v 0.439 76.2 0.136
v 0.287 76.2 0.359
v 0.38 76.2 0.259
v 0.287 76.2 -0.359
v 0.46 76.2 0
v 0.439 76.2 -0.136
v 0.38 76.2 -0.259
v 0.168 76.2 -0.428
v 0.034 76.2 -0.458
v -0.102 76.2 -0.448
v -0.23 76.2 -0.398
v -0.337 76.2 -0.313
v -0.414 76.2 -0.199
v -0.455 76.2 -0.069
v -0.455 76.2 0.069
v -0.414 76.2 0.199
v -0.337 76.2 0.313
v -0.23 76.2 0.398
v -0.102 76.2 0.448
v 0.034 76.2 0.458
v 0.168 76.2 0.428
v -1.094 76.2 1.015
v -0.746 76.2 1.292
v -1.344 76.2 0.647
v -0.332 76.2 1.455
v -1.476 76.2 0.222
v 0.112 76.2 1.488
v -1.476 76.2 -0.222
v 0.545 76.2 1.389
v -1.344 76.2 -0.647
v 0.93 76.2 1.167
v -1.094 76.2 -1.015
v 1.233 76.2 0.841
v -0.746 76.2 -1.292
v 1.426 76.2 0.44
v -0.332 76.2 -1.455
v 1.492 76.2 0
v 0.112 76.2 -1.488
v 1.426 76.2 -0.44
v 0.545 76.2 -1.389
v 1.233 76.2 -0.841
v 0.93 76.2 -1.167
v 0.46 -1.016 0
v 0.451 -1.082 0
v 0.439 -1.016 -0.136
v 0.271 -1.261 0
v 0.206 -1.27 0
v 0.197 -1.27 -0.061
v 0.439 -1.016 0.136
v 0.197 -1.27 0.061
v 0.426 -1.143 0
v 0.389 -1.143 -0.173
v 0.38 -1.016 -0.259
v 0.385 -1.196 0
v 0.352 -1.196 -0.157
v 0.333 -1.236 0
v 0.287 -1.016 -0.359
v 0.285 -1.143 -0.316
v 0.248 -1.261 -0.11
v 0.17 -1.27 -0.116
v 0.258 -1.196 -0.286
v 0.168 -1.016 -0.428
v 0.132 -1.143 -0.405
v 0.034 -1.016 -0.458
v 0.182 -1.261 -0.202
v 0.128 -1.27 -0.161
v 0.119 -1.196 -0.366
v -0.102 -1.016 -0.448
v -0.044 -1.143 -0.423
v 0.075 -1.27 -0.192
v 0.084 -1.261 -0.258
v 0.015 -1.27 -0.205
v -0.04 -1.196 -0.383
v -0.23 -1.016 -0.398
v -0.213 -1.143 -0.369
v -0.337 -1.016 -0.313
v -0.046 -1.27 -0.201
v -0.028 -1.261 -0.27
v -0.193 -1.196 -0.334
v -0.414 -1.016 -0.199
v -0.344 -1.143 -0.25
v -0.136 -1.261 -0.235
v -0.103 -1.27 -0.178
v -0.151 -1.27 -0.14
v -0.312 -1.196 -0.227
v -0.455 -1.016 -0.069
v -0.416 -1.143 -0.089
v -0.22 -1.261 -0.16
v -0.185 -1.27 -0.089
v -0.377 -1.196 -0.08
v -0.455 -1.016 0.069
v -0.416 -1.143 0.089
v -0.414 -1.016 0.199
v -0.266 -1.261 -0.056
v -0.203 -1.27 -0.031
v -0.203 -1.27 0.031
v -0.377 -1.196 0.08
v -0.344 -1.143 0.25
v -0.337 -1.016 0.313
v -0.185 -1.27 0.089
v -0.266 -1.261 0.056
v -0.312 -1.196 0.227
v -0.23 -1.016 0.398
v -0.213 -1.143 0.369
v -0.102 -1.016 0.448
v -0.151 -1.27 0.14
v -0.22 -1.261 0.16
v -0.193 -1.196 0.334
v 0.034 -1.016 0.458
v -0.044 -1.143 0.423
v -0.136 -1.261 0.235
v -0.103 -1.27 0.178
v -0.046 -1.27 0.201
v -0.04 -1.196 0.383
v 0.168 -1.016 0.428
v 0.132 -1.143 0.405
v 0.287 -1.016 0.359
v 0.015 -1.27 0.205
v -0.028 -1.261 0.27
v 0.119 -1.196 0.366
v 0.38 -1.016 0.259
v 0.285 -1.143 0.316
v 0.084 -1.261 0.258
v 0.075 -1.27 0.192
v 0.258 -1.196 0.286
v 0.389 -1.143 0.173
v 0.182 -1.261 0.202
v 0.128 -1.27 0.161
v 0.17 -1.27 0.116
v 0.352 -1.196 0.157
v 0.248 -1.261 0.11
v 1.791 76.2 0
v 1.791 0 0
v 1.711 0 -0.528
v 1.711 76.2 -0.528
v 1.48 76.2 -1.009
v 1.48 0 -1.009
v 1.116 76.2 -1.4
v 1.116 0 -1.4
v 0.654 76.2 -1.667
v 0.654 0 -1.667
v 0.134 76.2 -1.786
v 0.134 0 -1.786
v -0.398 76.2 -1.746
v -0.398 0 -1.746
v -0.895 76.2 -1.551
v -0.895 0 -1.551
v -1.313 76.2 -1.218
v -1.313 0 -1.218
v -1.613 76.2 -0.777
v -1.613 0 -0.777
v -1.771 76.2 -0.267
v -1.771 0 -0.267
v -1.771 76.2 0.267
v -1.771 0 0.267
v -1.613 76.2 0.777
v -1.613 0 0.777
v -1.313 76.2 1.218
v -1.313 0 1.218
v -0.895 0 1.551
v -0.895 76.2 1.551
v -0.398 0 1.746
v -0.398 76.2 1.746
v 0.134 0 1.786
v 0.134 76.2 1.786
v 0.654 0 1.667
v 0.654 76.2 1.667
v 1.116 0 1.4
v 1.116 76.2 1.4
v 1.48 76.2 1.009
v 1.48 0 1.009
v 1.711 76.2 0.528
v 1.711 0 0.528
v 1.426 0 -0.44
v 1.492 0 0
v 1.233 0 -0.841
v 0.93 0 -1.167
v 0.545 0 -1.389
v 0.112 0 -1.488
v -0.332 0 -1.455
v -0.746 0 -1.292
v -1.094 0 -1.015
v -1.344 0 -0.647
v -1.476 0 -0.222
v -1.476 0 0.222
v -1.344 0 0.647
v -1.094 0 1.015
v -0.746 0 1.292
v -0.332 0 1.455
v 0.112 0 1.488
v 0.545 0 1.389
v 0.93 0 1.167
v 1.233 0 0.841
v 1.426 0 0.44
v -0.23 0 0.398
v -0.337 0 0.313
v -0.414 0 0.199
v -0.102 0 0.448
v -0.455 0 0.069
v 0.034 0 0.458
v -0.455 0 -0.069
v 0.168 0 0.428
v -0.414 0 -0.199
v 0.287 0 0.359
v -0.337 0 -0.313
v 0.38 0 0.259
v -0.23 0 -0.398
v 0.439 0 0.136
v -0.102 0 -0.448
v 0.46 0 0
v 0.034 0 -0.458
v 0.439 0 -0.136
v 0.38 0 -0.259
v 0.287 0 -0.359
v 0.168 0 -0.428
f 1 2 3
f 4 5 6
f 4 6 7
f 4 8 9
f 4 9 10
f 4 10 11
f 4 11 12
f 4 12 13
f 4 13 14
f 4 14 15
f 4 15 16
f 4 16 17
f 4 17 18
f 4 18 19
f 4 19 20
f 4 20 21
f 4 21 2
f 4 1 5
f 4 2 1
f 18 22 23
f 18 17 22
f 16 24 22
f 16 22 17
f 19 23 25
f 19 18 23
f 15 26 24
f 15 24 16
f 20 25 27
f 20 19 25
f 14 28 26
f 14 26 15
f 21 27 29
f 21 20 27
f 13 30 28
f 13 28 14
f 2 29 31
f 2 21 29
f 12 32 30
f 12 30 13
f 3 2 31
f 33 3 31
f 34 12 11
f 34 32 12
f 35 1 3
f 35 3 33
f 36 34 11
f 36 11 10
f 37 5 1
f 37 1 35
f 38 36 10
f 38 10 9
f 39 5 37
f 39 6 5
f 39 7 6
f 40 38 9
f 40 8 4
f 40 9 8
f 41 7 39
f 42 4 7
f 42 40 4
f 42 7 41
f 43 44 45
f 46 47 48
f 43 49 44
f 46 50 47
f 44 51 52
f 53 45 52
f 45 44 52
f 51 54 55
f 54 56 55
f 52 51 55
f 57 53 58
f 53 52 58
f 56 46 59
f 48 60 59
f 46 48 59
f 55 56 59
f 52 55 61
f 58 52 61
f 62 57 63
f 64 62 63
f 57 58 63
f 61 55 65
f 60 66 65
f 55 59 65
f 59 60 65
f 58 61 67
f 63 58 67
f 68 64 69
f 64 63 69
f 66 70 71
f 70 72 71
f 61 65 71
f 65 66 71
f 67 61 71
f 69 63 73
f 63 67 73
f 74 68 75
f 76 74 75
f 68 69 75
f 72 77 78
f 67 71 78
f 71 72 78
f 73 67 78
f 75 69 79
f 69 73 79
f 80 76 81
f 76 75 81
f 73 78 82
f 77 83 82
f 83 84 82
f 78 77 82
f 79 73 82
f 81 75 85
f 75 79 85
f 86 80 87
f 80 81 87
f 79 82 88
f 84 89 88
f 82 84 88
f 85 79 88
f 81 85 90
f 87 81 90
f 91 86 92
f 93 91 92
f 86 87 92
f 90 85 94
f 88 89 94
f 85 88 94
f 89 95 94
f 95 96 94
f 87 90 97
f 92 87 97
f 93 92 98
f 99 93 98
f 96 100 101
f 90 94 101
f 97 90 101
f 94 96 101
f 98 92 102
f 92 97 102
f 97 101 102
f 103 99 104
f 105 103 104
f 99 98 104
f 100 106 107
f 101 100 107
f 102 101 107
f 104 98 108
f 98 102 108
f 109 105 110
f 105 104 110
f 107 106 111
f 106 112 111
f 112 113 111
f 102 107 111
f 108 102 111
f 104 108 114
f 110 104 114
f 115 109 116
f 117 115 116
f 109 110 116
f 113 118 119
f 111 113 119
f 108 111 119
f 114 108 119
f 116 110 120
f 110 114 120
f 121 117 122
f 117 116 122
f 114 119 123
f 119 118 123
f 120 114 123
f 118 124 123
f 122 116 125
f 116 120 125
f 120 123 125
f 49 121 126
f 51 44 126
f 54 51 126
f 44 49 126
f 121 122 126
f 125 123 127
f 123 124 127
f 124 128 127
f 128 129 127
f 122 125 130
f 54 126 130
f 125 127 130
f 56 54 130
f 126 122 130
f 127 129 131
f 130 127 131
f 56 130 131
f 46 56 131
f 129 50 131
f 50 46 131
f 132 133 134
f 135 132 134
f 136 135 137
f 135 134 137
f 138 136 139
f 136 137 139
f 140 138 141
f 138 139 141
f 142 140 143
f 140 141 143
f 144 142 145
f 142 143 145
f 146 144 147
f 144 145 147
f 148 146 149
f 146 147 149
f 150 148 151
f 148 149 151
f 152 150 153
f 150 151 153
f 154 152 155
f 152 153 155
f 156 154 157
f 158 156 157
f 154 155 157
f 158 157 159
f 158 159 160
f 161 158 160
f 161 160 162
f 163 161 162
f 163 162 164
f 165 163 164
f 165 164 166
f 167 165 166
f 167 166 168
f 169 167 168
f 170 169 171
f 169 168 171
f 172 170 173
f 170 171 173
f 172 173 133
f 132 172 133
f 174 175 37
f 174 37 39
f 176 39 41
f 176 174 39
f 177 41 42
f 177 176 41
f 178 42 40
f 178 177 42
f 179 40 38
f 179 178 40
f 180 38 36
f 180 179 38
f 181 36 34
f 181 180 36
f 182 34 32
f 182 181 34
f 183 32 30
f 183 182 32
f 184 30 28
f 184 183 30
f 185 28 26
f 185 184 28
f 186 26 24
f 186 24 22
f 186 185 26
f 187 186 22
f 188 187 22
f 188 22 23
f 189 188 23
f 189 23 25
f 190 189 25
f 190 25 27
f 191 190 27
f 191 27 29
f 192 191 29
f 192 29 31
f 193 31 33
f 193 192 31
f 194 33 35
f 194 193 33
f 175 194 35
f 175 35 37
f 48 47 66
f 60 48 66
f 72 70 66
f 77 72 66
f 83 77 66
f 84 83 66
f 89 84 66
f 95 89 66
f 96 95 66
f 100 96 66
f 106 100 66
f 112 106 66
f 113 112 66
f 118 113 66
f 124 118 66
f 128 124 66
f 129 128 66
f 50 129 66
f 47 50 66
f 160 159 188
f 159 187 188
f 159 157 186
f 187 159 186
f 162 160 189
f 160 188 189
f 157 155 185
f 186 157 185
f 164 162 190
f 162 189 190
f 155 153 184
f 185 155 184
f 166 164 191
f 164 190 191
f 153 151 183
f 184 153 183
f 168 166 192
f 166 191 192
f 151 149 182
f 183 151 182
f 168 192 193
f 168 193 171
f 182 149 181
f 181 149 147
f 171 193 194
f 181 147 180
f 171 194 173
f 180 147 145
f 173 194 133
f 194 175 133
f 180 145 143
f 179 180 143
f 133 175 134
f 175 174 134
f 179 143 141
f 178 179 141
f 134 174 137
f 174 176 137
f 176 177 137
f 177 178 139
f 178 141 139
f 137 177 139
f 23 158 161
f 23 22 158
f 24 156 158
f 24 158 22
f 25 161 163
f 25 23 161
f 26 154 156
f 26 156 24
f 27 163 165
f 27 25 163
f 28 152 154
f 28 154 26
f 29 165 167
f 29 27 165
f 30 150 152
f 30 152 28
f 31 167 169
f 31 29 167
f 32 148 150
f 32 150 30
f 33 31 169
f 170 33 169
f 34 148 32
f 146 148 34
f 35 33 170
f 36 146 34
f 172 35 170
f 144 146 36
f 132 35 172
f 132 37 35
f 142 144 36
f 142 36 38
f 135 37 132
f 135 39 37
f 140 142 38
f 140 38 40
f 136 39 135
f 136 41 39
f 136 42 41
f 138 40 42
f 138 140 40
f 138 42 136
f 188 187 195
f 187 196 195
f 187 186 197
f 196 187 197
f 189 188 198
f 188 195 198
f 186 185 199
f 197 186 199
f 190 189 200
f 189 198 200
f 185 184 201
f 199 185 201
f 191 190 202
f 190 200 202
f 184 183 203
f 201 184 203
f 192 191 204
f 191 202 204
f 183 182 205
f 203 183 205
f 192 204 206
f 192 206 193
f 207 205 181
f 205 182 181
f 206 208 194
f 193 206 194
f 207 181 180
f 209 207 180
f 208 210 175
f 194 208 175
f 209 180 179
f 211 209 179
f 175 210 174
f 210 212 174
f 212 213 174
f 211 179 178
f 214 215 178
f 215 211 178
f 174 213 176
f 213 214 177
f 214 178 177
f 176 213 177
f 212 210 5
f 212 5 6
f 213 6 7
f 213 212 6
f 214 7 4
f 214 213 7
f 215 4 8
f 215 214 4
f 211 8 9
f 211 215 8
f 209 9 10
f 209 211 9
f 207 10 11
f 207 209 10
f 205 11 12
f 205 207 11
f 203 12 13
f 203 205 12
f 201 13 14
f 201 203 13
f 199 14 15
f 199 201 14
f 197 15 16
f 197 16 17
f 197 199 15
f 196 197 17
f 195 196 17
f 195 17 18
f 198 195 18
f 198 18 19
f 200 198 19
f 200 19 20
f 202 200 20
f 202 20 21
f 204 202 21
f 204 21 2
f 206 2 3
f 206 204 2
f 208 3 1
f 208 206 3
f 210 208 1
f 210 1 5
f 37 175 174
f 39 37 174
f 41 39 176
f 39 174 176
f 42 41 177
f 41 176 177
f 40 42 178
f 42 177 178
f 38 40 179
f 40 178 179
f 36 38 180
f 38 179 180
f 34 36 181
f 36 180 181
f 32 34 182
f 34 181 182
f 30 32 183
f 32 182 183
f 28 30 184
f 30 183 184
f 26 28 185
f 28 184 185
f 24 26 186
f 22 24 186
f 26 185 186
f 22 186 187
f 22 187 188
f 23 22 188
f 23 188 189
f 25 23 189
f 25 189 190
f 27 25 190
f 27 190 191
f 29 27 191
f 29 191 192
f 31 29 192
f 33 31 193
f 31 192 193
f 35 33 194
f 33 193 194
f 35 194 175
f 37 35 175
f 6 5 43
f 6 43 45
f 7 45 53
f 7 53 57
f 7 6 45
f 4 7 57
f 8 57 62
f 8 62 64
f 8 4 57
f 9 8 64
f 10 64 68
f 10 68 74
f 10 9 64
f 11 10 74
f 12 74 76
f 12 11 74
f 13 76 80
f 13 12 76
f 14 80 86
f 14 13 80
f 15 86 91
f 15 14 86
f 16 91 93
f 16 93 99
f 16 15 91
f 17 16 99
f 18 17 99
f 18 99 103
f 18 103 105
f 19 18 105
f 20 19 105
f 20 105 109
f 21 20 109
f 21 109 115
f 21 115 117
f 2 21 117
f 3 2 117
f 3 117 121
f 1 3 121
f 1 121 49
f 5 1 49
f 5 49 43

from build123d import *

# Parameters (mm, degrees)
SKETCH1_R                = 0.45974
BOSS_EXTRUDE1_DEPTH      = 76.2
BOSS_EXTRUDE1_DEPTH_BACK = 1.27
SKETCH2_R                = 1.49225
SKETCH2_R_2              = 0.45974
BOSS_EXTRUDE2_DEPTH      = 76.2
SKETCH3_R                = 1.7907
SKETCH3_R_2              = 1.49225
BOSS_EXTRUDE3_DEPTH      = 76.2
FILLET1_R                = 0.254


with BuildPart() as part:
    # Sketch1 → Boss-Extrude1 (new body, two sides)
    with BuildSketch(Plane(origin=(0, 0, 0), x_dir=(1, 0, 0), z_dir=(0, 1, 0))) as boss_extrude1_sk:
        Circle(SKETCH1_R)
    extrude(amount=BOSS_EXTRUDE1_DEPTH)
    extrude(boss_extrude1_sk.sketch, amount=-BOSS_EXTRUDE1_DEPTH_BACK)

    # Fillet1
    fillet1_edges = [part.edges().sort_by_distance(p)[0] for p in [
        (-0.45974, -1.27, 0),
    ]]
    fillet(fillet1_edges, radius=FILLET1_R)


with BuildPart() as body_2:
    # Sketch2 → Boss-Extrude2 (new body)
    with BuildSketch(Plane(origin=(0, 0, 0), x_dir=(1, 0, 0), z_dir=(0, 1, 0))):
        Circle(SKETCH2_R)
        Circle(SKETCH2_R_2, mode=Mode.SUBTRACT)
    extrude(amount=BOSS_EXTRUDE2_DEPTH)


with BuildPart() as body_3:
    # Sketch3 → Boss-Extrude3 (new body)
    with BuildSketch(Plane(origin=(0, 0, 0), x_dir=(1, 0, 0), z_dir=(0, 1, 0))):
        Circle(SKETCH3_R)
        Circle(SKETCH3_R_2, mode=Mode.SUBTRACT)
    extrude(amount=BOSS_EXTRUDE3_DEPTH)


solid = Compound([part.part, body_2.part, body_3.part])
